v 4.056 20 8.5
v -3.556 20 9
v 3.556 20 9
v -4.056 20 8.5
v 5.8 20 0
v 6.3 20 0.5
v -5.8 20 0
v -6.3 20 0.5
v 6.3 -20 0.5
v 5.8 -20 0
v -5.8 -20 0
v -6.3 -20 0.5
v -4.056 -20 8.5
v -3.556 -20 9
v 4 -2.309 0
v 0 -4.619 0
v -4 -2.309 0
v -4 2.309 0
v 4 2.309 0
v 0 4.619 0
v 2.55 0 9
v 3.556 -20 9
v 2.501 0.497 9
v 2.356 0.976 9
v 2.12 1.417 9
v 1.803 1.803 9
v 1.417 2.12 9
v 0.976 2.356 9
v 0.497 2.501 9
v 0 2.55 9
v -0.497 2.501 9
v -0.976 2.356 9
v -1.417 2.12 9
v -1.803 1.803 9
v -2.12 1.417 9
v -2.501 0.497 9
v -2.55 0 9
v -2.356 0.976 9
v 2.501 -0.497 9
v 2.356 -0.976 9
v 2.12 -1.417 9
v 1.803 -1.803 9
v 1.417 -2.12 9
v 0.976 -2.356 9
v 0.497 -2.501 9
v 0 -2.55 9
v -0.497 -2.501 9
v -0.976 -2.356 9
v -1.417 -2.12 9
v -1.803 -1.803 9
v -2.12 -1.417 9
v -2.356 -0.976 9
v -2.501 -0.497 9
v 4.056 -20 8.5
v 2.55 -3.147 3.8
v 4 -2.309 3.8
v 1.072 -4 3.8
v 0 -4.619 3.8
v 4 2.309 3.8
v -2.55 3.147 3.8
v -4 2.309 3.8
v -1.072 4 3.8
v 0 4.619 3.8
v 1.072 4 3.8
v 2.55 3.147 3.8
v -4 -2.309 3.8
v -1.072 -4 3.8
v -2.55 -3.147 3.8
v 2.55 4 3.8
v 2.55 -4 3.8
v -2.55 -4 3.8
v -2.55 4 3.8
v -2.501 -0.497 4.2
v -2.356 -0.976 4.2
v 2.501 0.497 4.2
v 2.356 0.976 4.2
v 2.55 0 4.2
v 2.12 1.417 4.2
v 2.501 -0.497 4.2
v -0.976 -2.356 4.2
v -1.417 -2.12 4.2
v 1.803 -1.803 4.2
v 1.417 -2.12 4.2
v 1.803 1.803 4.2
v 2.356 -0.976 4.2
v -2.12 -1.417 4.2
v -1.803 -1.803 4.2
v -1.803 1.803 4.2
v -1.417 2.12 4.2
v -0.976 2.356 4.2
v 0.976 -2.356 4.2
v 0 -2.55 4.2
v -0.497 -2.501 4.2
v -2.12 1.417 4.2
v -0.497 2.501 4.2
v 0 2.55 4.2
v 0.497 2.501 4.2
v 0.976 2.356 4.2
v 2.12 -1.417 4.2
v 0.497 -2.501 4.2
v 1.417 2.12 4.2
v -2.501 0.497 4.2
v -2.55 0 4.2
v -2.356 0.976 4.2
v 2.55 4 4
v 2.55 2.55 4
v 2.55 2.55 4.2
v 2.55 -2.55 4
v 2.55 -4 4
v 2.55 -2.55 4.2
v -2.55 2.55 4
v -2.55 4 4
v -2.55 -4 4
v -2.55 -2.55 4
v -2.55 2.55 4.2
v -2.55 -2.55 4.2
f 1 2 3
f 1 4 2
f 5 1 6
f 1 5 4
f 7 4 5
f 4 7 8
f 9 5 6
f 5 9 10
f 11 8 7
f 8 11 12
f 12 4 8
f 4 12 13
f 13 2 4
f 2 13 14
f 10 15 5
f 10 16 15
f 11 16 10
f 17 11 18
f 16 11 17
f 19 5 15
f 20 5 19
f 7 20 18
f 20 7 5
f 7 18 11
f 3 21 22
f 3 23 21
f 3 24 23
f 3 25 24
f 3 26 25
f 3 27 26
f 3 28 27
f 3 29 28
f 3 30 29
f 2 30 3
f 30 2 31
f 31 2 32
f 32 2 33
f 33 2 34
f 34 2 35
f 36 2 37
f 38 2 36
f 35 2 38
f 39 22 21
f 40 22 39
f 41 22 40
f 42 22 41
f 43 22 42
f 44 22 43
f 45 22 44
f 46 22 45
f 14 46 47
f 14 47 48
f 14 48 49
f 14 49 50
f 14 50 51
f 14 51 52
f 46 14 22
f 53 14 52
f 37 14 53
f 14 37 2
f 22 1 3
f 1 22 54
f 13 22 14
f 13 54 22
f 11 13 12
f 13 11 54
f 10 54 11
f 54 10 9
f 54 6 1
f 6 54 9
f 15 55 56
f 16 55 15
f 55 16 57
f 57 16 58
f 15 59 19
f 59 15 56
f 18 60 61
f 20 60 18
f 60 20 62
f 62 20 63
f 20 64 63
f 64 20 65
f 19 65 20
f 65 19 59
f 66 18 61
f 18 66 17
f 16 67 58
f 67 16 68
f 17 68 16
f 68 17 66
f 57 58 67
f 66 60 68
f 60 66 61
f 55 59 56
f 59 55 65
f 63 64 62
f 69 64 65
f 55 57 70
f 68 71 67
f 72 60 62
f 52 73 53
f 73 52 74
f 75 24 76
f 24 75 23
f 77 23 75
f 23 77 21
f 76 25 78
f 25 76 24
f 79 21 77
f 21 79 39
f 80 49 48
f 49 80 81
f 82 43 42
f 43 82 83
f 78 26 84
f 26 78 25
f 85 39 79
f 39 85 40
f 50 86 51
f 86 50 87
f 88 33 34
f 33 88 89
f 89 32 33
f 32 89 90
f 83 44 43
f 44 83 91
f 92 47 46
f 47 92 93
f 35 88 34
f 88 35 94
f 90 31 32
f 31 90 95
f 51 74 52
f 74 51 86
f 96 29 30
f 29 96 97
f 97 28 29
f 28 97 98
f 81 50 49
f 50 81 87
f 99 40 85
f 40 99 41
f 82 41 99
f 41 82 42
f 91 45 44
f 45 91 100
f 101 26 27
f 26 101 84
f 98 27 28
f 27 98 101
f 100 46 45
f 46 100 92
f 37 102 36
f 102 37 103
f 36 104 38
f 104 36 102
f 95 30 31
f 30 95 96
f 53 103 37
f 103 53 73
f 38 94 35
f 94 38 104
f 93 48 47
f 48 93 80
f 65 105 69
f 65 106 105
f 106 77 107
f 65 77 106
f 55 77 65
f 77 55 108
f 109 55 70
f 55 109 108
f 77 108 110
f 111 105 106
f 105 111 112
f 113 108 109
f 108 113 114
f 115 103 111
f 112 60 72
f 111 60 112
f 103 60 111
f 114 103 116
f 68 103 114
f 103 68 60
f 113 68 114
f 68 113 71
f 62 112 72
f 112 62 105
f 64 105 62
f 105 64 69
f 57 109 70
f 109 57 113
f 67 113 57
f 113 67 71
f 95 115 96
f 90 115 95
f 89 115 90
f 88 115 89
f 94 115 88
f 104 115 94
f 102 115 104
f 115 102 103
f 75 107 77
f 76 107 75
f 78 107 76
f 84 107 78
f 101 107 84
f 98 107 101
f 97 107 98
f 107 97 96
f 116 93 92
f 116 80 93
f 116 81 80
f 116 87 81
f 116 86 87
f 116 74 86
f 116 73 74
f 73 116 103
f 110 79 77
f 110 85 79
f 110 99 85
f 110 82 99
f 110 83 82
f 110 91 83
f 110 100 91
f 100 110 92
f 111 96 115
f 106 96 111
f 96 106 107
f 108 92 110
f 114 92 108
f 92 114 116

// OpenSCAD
// Dovetail Bolt Insert — Parametric Model
// All dimensions in mm
//
// Orientation:
//   Bottom (wide, "B") = z=0 — sits at the bottom of the dovetail slot
//   Top (narrow, "T")  = z=dv_height — at bench surface level
//   Bolt head pocket is recessed into the bottom face (z=0)
//   Bolt shaft points upward through the full height
//
// Standard 1/2" bench dog dovetail slot:
//   Bottom width: 12.7 mm (1/2"), Height: 9.525 mm (3/8"), Walls: 14° from vertical
//   Derived slot top opening: 12.7 - 2 * 9.525 * tan(14°) ≈ 7.95 mm

// --- Dovetail Insert Profile ---
dv_bottom_width = 12.6;  // Width at bottom (widest face); slightly less than 12.7 mm slot bottom
dv_height       = 9.0;   // Height of insert; slightly less than 9.525 mm slot depth
wall_angle      = 14;    // Wall angle in degrees from vertical

// --- Bolt Dimensions ---
head_width     = 8;    // Hex head flat-to-flat width (M5 default)
head_height    = 3.8;  // Hex head thickness
shaft_diameter = 5.1;  // Bolt shaft clearance diameter

// --- Insert Dimensions ---
insert_length = 40;

// --- Print Settings ---
layer_height = 0.2;  // Bridge step depth for support-free printing

// --- Fixed ---
chamfer = 0.5;

// Derived
dv_top_width = dv_bottom_width - 2 * dv_height * tan(wall_angle);
head_radius     = head_width / 2 / cos(30);

// Cross-section in XY plane.
// Bottom (wide) at Y=0, Top (narrow) at Y=dv_height.
// Chamfered corners (chamfer cuts corners at both top and bottom edges).
function dv_cross_section(tw, bw, h, ch) = [
    [-bw/2 + ch,  0      ],   // bottom-left  (chamfered along bottom)
    [-bw/2,       ch     ],   // bottom-left  (chamfered along wall)
    [-tw/2,       h - ch ],   // top-left     (chamfered along wall)
    [-tw/2 + ch,  h      ],   // top-left     (chamfered along top)
    [ tw/2 - ch,  h      ],   // top-right    (chamfered along top)
    [ tw/2,       h - ch ],   // top-right    (chamfered along wall)
    [ bw/2,       ch     ],   // bottom-right (chamfered along wall)
    [ bw/2 - ch,  0      ],   // bottom-right (chamfered along bottom)
];

module dv_body() {
    // Extrude cross-section along the insert length (Y axis).
    // rotate([90,0,0]) maps polygon Y → 3D Z, extrusion Z → 3D -Y,
    // then translate centres it on Y=0.
    translate([0, insert_length / 2, 0])
    rotate([90, 0, 0])
    linear_extrude(insert_length)
        polygon(dv_cross_section(dv_top_width, dv_bottom_width, dv_height, chamfer));
}

module hex_pocket() {
    // Hex bolt head recess cut into the bottom face (z=0)
    // Rotated 30° so flat faces are parallel to the slot walls (±X), minimising width.
    translate([0, 0, -0.01])
        rotate([0, 0, 30])
            cylinder(h = head_height + 0.01, r = head_radius, $fn = 6);
}

module shaft_hole() {
    // Clearance hole for bolt shaft through the full height
    translate([0, 0, -0.01])
        cylinder(h = dv_height + 0.02, d = shaft_diameter, $fn = 32);
}

module bridge_step() {
    // Thin rectangular slot at the ceiling of the hex pocket (z = head_height).
    // Width matches the shaft hole so the printer can bridge without supports.
    translate([-shaft_diameter/2, -head_width/2, head_height])
        cube([shaft_diameter, head_width, layer_height]);
}

module bridge_step_square() {
    // Square slot one layer above the first bridge step.
    translate([-shaft_diameter/2, -shaft_diameter/2, head_height + layer_height])
        cube([shaft_diameter, shaft_diameter, layer_height]);
}

difference() {
    dv_body();
    hex_pocket();
    shaft_hole();
    bridge_step();
    bridge_step_square();
}
